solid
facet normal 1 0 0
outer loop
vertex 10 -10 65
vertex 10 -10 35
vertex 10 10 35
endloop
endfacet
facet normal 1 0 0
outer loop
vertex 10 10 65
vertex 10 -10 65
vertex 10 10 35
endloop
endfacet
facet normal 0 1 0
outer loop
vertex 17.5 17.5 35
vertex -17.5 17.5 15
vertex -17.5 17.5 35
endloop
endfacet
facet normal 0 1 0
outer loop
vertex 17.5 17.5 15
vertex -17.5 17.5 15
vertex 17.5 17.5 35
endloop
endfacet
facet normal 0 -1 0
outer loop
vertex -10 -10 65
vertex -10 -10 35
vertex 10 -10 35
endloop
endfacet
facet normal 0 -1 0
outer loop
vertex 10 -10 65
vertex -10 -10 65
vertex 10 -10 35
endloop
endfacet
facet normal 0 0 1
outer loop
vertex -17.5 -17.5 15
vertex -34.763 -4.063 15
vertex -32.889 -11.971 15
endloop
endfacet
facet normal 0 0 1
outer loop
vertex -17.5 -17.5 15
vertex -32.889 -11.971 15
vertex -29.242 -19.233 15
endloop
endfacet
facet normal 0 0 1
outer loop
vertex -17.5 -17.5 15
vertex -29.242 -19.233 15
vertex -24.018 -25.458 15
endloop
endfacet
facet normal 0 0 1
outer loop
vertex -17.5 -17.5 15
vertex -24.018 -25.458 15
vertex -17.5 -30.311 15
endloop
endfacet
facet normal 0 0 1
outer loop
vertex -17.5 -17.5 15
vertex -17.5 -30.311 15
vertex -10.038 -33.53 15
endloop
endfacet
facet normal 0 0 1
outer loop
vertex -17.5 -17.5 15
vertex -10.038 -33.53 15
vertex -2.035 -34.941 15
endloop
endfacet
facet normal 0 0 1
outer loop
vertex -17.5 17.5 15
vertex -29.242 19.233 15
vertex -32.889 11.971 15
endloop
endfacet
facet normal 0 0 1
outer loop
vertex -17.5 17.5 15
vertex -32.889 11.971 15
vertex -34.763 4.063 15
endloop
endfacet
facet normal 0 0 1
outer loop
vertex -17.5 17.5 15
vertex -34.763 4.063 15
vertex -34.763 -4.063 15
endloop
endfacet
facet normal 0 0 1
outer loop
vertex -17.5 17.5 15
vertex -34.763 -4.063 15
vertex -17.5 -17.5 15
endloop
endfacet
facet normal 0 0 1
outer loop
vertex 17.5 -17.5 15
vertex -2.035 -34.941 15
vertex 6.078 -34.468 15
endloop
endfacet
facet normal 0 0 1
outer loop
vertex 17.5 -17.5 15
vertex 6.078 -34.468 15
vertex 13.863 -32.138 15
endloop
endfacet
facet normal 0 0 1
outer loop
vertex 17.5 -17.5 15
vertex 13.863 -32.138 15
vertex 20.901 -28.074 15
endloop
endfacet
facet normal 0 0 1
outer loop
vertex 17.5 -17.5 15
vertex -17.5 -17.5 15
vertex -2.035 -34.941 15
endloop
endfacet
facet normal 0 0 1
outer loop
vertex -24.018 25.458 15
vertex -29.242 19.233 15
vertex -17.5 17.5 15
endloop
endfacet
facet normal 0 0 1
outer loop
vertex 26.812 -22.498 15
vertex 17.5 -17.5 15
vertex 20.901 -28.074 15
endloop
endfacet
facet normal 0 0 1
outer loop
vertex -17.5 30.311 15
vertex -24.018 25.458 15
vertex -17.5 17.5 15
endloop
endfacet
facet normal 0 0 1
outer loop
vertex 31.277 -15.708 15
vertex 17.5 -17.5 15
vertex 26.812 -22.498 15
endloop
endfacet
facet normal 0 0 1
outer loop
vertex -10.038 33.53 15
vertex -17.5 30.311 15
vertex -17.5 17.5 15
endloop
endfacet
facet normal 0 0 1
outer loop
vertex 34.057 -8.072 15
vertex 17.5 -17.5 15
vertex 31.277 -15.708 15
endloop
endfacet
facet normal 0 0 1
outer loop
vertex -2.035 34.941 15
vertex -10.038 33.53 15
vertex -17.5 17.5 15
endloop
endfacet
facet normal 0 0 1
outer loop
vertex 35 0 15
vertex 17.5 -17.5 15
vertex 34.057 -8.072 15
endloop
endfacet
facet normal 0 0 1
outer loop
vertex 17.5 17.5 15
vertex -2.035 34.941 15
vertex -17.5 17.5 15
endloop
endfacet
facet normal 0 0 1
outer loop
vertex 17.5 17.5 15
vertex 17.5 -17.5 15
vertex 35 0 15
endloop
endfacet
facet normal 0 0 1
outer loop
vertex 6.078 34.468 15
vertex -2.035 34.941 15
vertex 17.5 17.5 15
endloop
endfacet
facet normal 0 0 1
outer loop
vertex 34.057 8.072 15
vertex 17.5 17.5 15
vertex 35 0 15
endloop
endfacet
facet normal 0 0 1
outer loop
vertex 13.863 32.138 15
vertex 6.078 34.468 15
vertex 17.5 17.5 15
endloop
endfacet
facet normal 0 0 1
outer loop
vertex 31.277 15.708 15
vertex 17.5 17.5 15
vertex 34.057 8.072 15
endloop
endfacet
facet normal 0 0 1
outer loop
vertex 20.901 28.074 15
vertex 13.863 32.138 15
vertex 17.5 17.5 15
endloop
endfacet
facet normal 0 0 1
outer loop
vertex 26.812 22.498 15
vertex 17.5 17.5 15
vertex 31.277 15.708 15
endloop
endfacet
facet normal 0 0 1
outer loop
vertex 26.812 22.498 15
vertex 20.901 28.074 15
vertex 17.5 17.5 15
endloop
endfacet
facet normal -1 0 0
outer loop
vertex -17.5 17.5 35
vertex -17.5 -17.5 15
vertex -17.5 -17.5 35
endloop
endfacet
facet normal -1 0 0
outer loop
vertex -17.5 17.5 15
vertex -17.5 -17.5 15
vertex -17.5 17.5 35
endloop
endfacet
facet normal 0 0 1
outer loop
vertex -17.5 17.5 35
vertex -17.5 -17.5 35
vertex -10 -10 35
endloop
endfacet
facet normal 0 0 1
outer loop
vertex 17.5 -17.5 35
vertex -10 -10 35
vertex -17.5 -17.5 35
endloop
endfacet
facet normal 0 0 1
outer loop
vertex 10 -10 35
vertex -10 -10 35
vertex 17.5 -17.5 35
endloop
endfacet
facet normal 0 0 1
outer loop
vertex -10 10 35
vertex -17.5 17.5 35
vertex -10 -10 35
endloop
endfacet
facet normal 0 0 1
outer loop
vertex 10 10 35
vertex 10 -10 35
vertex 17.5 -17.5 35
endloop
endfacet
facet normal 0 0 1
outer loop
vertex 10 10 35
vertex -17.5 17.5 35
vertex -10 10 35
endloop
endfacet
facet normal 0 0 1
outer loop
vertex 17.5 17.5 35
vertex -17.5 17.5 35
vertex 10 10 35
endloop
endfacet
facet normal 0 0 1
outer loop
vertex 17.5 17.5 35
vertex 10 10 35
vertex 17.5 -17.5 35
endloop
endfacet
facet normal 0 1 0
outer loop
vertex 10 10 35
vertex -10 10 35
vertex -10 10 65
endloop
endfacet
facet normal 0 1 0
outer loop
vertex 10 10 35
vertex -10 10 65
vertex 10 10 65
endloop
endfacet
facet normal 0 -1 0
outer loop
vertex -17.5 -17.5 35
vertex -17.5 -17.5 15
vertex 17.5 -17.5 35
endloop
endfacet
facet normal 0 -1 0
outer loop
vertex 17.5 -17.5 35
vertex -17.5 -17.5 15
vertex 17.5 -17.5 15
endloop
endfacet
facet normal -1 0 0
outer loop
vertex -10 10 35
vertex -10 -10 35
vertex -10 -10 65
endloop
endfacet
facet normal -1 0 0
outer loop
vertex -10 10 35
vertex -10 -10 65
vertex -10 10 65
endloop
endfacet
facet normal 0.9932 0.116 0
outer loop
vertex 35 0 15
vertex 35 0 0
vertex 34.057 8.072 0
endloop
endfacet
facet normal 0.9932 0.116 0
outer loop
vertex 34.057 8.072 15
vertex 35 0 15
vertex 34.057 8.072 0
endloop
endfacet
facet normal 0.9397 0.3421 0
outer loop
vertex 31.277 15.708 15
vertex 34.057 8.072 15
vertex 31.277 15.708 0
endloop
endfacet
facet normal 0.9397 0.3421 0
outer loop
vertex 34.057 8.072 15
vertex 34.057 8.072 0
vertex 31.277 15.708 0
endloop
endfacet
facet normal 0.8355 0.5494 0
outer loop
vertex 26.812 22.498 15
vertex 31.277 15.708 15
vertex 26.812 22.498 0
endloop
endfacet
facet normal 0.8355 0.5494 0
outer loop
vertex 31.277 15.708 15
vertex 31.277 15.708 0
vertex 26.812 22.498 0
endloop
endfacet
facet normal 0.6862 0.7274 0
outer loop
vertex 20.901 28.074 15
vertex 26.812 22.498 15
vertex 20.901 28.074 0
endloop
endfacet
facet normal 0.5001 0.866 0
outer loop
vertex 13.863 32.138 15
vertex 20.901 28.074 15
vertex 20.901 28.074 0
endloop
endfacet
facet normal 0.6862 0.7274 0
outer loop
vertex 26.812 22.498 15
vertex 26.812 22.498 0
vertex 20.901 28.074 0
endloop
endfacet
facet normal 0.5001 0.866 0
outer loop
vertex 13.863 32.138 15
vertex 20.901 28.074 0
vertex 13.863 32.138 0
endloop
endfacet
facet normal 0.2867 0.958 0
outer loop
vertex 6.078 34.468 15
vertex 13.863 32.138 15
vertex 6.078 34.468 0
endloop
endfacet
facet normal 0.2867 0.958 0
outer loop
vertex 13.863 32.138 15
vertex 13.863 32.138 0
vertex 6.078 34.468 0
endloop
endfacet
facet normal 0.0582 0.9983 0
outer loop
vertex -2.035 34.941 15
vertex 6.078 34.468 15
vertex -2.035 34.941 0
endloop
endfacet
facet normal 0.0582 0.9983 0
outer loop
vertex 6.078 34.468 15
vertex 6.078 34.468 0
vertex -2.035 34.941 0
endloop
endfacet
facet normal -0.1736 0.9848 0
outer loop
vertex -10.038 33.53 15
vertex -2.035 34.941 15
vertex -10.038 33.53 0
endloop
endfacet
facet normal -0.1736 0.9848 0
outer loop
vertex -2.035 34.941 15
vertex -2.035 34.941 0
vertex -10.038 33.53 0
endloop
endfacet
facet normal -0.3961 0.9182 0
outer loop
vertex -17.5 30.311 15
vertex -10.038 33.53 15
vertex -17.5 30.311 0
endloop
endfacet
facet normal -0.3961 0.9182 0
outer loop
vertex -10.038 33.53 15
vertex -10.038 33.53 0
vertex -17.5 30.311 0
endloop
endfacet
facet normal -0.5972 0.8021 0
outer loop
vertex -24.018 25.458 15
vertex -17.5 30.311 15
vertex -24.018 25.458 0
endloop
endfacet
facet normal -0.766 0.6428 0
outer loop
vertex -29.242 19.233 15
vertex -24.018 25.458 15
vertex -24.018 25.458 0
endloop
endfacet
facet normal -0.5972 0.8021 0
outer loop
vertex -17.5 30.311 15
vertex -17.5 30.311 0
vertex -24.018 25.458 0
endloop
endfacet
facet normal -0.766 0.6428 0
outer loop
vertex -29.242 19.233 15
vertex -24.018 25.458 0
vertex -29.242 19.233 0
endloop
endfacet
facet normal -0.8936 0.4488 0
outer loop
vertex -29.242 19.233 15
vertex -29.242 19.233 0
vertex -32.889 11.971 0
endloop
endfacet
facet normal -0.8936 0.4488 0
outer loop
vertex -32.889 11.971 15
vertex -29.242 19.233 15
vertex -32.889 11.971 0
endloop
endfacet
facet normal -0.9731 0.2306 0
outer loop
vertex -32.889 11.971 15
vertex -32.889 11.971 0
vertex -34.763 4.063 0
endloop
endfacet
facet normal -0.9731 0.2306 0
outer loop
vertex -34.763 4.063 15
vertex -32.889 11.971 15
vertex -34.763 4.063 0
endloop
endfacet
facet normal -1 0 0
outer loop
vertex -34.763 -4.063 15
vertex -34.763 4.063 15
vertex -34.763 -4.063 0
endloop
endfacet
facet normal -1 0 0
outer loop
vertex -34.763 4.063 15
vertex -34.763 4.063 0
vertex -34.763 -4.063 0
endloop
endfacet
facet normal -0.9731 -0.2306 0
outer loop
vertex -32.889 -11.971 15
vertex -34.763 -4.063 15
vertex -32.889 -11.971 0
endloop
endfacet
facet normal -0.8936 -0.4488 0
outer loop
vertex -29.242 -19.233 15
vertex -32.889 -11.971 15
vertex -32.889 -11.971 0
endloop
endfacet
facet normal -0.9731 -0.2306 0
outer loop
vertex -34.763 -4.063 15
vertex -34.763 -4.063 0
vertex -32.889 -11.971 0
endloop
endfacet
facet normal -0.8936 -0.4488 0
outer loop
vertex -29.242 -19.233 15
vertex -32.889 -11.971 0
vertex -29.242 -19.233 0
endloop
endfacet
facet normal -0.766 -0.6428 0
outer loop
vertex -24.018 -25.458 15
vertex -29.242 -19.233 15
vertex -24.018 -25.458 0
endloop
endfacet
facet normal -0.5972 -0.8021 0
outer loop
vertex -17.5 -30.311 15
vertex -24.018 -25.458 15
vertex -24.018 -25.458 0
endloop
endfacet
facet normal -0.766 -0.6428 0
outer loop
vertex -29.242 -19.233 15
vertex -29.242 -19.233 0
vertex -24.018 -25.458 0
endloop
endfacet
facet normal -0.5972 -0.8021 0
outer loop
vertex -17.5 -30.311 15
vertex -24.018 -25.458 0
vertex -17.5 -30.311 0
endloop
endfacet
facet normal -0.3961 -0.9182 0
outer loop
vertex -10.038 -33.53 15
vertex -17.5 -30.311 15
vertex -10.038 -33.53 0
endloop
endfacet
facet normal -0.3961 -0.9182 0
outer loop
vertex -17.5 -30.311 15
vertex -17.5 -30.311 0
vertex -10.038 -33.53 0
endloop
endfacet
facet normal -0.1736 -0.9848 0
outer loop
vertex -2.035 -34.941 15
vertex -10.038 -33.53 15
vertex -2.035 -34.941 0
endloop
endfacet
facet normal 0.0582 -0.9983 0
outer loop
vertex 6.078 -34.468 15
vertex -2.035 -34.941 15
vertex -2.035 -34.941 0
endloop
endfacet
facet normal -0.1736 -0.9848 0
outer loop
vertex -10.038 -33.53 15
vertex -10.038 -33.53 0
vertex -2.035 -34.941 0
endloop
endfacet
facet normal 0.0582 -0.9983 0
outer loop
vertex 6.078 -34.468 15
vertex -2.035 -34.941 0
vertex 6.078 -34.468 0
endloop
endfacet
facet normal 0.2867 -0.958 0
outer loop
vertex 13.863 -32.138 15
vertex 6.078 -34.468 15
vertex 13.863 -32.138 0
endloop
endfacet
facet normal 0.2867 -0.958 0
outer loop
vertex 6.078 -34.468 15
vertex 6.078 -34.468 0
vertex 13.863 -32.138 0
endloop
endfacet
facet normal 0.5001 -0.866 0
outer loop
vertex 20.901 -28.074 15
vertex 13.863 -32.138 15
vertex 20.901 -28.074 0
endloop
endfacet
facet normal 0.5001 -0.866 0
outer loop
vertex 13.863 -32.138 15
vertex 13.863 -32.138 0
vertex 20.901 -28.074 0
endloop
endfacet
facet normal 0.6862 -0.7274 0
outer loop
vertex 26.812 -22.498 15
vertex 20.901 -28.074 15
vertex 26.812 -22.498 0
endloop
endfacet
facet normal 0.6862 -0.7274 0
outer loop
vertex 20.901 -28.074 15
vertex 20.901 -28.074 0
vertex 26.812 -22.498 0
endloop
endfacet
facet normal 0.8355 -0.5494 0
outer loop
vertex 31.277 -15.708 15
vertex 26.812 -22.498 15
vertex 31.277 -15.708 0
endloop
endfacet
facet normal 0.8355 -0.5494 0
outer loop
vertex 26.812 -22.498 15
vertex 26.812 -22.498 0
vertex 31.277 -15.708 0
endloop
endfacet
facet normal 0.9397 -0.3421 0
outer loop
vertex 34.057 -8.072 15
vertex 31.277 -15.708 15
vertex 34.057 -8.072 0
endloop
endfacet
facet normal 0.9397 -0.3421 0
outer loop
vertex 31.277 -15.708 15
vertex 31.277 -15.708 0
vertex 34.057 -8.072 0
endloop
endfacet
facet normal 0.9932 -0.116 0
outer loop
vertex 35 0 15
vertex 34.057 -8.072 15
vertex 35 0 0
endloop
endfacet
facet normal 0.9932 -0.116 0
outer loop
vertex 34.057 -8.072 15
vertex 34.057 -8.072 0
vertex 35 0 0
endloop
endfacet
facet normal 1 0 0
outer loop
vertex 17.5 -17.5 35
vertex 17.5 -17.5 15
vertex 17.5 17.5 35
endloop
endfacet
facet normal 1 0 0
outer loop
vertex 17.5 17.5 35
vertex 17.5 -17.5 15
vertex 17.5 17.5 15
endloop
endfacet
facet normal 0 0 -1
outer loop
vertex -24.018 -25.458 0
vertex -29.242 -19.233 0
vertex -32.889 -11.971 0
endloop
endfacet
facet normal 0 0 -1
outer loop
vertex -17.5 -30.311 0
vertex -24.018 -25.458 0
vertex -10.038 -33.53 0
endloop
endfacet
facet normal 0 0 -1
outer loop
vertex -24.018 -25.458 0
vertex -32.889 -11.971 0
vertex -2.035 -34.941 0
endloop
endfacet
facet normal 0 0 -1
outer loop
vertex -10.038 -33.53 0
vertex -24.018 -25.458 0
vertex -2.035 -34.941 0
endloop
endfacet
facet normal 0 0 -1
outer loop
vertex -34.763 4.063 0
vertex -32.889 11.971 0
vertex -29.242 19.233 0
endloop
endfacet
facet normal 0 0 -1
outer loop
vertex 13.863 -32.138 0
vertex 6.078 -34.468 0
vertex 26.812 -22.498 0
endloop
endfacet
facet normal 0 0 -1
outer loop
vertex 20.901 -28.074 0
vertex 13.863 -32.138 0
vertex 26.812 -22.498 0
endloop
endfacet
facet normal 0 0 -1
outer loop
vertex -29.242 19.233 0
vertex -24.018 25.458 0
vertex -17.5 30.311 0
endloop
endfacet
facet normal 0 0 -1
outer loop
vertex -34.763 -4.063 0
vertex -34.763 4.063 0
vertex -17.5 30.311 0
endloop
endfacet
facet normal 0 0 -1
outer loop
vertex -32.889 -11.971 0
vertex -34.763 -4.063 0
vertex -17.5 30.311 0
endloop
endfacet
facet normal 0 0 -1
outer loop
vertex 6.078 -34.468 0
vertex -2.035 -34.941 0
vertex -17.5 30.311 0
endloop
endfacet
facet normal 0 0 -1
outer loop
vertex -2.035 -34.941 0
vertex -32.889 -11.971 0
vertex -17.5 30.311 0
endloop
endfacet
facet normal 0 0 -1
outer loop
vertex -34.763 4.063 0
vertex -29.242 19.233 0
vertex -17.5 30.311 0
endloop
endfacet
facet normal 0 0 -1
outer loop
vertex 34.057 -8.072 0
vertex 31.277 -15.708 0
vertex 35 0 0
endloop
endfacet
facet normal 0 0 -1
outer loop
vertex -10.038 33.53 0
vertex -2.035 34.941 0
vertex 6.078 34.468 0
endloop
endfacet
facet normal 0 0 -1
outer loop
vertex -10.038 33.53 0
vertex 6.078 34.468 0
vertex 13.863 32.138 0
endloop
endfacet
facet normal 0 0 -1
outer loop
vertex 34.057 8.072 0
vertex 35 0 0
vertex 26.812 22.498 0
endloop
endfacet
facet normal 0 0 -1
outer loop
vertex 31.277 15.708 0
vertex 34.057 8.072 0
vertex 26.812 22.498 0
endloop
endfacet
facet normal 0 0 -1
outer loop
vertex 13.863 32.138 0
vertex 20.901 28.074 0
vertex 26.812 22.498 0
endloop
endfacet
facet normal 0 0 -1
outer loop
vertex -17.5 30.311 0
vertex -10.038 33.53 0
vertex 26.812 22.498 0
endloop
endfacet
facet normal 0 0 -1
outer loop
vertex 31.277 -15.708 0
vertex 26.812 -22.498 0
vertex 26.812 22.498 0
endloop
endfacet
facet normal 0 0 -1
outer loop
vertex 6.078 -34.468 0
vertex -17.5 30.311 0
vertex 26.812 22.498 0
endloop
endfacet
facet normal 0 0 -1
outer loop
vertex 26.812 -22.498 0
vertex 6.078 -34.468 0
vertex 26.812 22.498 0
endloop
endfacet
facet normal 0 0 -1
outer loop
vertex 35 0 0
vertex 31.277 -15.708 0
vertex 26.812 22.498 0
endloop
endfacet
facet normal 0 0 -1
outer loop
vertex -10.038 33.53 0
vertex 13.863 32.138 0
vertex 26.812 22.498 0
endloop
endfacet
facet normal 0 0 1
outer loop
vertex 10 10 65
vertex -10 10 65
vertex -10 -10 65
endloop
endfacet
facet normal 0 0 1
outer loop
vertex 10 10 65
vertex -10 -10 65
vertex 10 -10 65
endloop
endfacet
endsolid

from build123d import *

# Parameters (mm, degrees)
F0_R     = 35
F1_DEPTH = 15
F2_W     = 35
F2_H     = 35
F3_DEPTH = 20
F4_W     = 20
F4_H     = 20
F5_DEPTH = 30


with BuildPart() as f1:
    # F0 (on Top) → F1 (new body)
    with BuildSketch(Plane.XY):
        Circle(F0_R)
    extrude(amount=F1_DEPTH)

    # F2 (on face) → F3 (join)
    with BuildSketch(Plane.XY.offset(15)):
        Rectangle(F2_W, F2_H)
    extrude(amount=F3_DEPTH)

    # F4 (on face) → F5 (join)
    with BuildSketch(Plane.XY.offset(35)):
        Rectangle(F4_W, F4_H)
    extrude(amount=F5_DEPTH)


solid = f1.part
